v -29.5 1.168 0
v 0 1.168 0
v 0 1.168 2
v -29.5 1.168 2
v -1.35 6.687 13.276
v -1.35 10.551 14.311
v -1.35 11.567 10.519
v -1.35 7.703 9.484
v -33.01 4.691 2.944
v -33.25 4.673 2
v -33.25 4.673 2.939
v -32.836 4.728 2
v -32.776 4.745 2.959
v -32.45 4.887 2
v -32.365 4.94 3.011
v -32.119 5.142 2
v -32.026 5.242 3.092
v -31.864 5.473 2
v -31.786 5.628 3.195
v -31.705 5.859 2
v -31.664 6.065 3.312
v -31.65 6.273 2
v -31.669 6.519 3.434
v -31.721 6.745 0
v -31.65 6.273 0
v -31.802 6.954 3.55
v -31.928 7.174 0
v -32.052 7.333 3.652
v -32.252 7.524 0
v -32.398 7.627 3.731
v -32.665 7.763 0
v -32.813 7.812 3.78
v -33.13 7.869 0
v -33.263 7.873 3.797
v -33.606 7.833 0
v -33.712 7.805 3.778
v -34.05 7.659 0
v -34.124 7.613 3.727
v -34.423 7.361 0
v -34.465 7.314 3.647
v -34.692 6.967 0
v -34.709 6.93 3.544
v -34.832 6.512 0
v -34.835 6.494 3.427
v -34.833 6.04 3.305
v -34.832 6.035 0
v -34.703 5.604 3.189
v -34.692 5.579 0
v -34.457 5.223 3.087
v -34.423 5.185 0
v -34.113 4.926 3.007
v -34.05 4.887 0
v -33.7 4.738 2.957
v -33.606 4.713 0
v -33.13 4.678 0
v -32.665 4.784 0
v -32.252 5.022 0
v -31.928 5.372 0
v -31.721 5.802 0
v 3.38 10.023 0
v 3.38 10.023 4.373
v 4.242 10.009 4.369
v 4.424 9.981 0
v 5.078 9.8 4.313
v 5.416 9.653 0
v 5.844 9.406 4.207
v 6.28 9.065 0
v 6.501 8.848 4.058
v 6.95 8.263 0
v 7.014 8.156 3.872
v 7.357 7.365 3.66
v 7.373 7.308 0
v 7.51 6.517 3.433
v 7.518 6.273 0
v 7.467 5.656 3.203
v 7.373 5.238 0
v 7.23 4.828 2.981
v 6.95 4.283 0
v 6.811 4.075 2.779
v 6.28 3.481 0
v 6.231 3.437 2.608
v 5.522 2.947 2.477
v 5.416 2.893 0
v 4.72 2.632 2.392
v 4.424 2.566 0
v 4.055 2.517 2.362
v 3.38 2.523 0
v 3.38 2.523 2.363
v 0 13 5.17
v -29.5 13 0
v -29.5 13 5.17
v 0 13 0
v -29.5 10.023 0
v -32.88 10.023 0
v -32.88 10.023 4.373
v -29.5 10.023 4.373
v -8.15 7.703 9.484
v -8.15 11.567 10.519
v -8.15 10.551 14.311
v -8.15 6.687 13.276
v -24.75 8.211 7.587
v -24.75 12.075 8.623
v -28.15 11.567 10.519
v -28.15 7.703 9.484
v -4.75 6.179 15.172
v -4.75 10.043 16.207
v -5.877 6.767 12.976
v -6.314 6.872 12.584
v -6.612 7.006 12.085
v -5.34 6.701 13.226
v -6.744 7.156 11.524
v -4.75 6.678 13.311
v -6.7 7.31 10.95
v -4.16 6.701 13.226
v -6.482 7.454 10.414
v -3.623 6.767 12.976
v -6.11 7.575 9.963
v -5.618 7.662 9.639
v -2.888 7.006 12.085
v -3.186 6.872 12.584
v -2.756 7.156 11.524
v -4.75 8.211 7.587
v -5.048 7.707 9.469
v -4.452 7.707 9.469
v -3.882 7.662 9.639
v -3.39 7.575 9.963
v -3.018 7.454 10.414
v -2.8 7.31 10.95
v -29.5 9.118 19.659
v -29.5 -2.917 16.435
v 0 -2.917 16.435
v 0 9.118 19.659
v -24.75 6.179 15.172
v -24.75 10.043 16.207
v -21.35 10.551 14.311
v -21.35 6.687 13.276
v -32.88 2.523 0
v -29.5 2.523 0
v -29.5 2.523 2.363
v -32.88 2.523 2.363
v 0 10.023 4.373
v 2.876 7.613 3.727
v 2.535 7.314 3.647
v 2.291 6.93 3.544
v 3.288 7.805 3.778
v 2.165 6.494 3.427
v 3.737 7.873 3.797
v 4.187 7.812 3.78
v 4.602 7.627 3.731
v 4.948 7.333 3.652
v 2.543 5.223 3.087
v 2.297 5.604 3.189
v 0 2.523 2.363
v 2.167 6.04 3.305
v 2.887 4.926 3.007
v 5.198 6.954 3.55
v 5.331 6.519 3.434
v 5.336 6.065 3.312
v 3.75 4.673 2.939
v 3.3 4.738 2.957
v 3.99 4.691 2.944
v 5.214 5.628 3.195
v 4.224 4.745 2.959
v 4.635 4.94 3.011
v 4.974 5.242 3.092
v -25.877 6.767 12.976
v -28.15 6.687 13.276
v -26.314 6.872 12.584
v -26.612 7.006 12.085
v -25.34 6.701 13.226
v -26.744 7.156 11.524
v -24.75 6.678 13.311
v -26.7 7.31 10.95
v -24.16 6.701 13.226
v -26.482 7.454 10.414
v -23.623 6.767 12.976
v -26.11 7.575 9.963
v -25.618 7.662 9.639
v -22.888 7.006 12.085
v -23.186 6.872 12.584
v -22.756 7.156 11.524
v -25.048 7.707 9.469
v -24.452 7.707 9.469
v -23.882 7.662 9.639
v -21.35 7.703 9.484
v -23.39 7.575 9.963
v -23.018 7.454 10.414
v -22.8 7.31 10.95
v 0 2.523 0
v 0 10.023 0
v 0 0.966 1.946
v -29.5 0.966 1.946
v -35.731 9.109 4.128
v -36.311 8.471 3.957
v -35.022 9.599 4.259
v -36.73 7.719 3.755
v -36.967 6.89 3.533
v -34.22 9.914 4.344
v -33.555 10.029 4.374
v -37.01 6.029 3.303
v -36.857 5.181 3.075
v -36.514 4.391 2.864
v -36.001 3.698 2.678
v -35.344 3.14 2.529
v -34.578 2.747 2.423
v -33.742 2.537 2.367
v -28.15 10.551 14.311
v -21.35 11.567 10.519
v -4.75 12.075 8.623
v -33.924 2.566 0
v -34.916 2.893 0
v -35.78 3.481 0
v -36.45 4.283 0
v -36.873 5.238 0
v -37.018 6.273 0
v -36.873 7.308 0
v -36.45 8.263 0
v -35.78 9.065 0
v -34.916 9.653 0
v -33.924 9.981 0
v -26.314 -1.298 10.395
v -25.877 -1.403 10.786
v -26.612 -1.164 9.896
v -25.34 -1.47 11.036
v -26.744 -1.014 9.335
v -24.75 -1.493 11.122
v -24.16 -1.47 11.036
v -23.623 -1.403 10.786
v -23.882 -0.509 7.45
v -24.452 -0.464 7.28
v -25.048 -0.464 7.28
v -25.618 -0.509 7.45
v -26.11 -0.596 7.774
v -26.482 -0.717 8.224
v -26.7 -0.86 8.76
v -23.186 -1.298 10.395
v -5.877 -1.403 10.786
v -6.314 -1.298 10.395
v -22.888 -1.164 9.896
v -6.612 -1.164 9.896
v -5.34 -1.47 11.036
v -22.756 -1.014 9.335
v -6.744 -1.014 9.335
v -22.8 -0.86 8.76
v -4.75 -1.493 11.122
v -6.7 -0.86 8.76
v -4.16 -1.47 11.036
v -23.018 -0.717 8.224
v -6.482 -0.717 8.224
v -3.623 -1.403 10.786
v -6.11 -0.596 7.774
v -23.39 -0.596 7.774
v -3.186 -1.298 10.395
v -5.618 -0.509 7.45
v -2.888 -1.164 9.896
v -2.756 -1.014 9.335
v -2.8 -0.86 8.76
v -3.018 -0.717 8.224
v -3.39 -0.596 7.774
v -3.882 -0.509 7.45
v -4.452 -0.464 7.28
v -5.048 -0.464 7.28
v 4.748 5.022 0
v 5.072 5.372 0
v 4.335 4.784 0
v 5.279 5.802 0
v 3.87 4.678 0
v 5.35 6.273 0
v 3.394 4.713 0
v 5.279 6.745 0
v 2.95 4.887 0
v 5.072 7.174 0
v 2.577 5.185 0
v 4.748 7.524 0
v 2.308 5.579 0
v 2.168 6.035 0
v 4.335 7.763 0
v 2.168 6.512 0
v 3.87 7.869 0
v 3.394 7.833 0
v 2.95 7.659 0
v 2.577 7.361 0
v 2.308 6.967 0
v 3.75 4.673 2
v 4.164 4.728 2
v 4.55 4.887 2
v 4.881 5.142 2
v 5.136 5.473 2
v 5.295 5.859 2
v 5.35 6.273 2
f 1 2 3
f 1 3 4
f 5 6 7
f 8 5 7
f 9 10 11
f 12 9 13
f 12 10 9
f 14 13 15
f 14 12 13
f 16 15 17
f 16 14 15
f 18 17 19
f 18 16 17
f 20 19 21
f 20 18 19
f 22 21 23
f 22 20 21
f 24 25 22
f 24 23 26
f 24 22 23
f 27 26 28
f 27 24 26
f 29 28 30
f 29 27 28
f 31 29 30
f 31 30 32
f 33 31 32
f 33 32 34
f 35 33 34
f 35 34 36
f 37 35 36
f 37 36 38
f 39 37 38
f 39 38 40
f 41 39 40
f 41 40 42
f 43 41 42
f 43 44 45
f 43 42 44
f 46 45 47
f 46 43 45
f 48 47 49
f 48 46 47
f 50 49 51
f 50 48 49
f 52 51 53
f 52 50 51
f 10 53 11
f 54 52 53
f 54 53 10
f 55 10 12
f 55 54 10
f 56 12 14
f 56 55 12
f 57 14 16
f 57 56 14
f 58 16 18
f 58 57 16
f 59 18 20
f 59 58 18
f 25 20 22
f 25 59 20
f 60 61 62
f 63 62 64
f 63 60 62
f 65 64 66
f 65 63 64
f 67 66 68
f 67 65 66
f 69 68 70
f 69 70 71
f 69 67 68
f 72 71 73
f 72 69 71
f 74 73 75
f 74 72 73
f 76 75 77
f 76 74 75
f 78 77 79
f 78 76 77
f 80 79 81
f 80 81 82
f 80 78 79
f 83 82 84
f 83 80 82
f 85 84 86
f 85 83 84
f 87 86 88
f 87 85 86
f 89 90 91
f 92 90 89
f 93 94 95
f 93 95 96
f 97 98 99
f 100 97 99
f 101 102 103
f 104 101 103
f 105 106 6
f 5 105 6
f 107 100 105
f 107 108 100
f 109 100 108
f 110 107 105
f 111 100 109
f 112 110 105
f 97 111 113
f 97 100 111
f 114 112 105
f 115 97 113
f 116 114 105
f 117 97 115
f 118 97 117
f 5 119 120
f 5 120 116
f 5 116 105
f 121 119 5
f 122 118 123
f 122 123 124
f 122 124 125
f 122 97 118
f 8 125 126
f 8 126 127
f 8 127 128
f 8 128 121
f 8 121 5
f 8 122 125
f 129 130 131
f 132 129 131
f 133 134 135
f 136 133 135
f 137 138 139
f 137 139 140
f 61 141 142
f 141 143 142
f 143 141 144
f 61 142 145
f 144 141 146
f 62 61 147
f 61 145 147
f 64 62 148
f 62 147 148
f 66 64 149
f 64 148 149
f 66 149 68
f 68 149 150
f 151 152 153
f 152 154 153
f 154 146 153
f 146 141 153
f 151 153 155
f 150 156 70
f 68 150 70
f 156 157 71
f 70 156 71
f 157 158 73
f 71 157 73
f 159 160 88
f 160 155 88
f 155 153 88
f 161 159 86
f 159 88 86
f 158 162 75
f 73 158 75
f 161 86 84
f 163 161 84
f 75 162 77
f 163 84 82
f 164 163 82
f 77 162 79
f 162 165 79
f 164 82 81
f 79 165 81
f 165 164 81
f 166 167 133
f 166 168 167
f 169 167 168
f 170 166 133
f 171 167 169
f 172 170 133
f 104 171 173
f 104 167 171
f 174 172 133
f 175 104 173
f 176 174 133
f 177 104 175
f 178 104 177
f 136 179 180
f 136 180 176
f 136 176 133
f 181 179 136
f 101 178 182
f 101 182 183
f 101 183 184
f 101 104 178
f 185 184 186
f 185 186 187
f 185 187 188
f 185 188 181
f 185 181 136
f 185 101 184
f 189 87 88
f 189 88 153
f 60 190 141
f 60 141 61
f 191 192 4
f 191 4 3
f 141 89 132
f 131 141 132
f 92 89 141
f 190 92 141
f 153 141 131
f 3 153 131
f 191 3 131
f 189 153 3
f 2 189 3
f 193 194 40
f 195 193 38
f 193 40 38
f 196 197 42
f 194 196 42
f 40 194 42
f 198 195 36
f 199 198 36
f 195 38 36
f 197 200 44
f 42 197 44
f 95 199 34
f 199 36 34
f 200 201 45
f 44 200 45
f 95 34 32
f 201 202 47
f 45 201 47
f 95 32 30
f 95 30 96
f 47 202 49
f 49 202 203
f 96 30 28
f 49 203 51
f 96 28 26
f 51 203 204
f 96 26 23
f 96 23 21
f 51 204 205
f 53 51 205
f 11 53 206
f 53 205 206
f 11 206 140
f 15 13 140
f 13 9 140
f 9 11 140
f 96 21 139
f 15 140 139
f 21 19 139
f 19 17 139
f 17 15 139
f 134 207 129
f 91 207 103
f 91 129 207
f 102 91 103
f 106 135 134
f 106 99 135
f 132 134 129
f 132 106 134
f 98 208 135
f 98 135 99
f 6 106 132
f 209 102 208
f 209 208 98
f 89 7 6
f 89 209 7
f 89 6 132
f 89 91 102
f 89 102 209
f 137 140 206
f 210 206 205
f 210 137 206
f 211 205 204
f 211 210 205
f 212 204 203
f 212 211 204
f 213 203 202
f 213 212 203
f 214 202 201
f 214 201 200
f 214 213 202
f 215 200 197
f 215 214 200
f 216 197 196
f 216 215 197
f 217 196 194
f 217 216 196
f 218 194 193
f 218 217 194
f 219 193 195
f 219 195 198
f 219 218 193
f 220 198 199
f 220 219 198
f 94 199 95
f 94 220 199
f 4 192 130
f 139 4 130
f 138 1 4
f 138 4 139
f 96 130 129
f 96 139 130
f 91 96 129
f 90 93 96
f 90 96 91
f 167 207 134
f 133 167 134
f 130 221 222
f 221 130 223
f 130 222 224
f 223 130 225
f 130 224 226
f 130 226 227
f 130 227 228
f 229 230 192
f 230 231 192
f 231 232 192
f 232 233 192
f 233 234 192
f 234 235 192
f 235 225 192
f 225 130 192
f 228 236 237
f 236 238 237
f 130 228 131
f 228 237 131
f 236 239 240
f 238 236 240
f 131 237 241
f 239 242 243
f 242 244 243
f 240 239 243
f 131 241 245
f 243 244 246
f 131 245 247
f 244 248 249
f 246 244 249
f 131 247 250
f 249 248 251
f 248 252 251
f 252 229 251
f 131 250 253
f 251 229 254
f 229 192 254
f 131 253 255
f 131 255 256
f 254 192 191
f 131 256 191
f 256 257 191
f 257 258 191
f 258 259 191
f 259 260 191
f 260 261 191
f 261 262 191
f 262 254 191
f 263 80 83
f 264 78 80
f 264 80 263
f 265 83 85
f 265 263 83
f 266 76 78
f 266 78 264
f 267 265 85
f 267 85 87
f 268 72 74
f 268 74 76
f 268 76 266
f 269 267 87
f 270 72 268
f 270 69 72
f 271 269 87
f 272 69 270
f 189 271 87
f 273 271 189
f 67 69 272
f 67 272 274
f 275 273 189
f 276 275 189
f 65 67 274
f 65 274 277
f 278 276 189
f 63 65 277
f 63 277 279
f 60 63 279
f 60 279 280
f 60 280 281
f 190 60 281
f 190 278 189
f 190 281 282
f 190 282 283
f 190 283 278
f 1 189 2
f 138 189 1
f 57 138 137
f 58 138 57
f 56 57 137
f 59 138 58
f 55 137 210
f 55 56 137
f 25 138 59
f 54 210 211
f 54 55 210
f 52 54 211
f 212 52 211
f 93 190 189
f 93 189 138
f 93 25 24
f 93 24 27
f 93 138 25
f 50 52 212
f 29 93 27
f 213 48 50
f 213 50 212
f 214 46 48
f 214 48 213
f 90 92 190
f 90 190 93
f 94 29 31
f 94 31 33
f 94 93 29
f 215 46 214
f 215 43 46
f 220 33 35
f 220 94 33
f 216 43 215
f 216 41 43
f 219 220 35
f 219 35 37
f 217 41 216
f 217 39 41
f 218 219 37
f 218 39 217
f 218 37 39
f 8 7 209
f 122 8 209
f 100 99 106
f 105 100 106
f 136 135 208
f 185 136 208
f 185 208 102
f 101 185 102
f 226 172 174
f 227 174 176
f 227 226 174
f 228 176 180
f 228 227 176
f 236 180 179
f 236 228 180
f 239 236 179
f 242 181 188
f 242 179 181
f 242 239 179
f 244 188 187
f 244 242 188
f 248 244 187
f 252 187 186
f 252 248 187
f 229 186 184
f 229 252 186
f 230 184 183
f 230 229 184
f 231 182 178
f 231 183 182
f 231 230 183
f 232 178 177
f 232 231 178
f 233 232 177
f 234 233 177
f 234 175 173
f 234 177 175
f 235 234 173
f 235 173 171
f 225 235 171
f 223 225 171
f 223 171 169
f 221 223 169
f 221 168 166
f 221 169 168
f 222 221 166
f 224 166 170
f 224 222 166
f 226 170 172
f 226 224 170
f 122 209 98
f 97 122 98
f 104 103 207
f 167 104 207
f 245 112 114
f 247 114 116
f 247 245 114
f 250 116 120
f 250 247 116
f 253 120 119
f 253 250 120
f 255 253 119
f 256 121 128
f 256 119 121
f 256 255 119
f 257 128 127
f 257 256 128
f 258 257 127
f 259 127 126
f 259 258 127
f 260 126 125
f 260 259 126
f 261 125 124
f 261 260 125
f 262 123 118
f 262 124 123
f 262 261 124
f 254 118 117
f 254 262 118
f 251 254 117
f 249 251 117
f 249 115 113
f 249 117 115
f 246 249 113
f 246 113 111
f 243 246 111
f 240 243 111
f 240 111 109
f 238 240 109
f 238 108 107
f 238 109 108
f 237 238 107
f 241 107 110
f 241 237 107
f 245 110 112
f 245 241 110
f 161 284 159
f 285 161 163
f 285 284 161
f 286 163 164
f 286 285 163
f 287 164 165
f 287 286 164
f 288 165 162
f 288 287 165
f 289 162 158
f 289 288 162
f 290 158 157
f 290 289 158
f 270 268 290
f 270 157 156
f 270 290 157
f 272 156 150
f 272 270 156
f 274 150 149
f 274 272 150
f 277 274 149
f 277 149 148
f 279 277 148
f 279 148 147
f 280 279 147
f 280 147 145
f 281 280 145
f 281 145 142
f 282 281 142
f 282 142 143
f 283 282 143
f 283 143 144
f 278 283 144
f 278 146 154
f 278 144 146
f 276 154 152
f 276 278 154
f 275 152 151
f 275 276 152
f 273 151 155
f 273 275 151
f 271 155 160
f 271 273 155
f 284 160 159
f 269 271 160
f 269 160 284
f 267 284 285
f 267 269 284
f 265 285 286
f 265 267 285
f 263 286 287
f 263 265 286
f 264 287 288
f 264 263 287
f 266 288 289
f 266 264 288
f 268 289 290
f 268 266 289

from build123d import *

# Parameters (mm, degrees)
SKETCH1_R           = 1.6
BOSS_EXTRUDE1_DEPTH = 2
SKETCH3_W           = 29.5
SKETCH3_H           = 15
SKETCH3_R           = 2
BOSS_EXTRUDE2_DEPTH = 11.638171
BOSS_EXTRUDE3_REACH = 45.79
SKETCH1_2_R         = 1.6
SKETCH3_2_W         = 29.5
SKETCH3_2_H         = 15
SKETCH3_2_R         = 2
BOSS_EXTRUDE4_DEPTH = 12.458742
CUT_EXTRUDE1_DEPTH  = 4


with BuildPart() as part:
    # Sketch1 → Boss-Extrude1 (new body)
    with BuildSketch(Plane.XY):
        with BuildLine():
            Line((-32.88, 10.023123532), (-29.5, 10.023123532))
            Line((-29.5, 10.023123532), (-29.5, 13))
            Line((-29.5, 13), (0, 13))
            Line((0, 13), (0, 10.023123532))
            Line((0, 10.023123532), (3.38, 10.023123532))
            ThreePointArc((3.38, 10.023123532), (7.518209124, 6.273123532), (3.38, 2.523123532))
            Line((3.38, 2.523123532), (0, 2.523123532))
            Line((0, 2.523123532), (0, 1.167746206))
            Line((0, 1.167746206), (-29.5, 1.167746206))
            Line((-29.5, 1.167746206), (-29.5, 2.523123532))
            Line((-29.5, 2.523123532), (-32.88, 2.523123532))
            ThreePointArc((-32.88, 2.523123532), (-37.018209124, 6.273123532), (-32.88, 10.023123532))
        make_face()
        with Locations((-33.25, 6.273123532)):
            Circle(SKETCH1_R, mode=Mode.SUBTRACT)
        with Locations((3.75, 6.273123532)):
            Circle(SKETCH1_R, mode=Mode.SUBTRACT)
    extrude(amount=BOSS_EXTRUDE1_DEPTH)


with BuildPart() as body_2:
    # Sketch3 → Boss-Extrude2 (new body)
    with BuildSketch(Plane(origin=(0, 1.387555227, 0.371794302), x_dir=(1, 0, 0), z_dir=(0, 0.9659258262890684, 0.2588190451025204))):
        with Locations((-14.75, -9.129616695)):
            Rectangle(SKETCH3_W, SKETCH3_H)
        with Locations(Location((-4.75, -9.129616695, 0), (0, 0, 270))):
            Circle(SKETCH3_R, mode=Mode.SUBTRACT)
        with Locations(Location((-24.75, -9.129616695, 0), (0, 0, 270))):
            Circle(SKETCH3_R, mode=Mode.SUBTRACT)
    extrude(amount=BOSS_EXTRUDE2_DEPTH)

    # Boss-Extrude3: up to this face of the body (flat: up to its plane)
    boss_extrude3_end = Plane(body_2.part.faces().sort_by_distance((-14.75, 6.58658436, 3.451973307))[0])
    # Sketch1<2> → Boss-Extrude3 (add, up to the picked face)
    with BuildSketch(Plane.XY, mode=Mode.PRIVATE) as boss_extrude3_sk1:
        with BuildLine():
            Line((-32.88, 10.023123532), (-29.5, 10.023123532))
            Line((-29.5, 10.023123532), (-29.5, 13))
            Line((-29.5, 13), (0, 13))
            Line((0, 13), (0, 10.023123532))
            Line((0, 10.023123532), (3.38, 10.023123532))
            ThreePointArc((3.38, 10.023123532), (7.518209124, 6.273123532), (3.38, 2.523123532))
            Line((3.38, 2.523123532), (0, 2.523123532))
            Line((0, 2.523123532), (0, 1.167746206))
            Line((0, 1.167746206), (-29.5, 1.167746206))
            Line((-29.5, 1.167746206), (-29.5, 2.523123532))
            Line((-29.5, 2.523123532), (-32.88, 2.523123532))
            ThreePointArc((-32.88, 2.523123532), (-37.018209124, 6.273123532), (-32.88, 10.023123532))
        make_face()
        with Locations(Location((-33.25, 6.273123532, 0), (0, 0, 270))):
            Circle(SKETCH1_2_R, mode=Mode.SUBTRACT)
        with Locations(Location((3.75, 6.273123532, 0), (0, 0, 270))):
            Circle(SKETCH1_2_R, mode=Mode.SUBTRACT)
    boss_extrude3_tool1 = split(extrude(boss_extrude3_sk1.sketch, amount=BOSS_EXTRUDE3_REACH, mode=Mode.PRIVATE), bisect_by=boss_extrude3_end, keep=Keep.BOTH, mode=Mode.PRIVATE)

    add(part.part)  # Boss-Extrude3 merges part
    add(boss_extrude3_tool1.solids().sort_by(Axis((-14.75, 6.925418, 0), (0, 0, 1)))[0])

    # Sketch3<2> → Boss-Extrude4 (add)
    with BuildSketch(Plane(origin=(0, 1.387555227, 0.371794302), x_dir=(1, 0, 0), z_dir=(0, 0.9659258262890684, 0.2588190451025204))):
        with Locations((-14.75, -9.129616695)):
            Rectangle(SKETCH3_2_W, SKETCH3_2_H)
        with Locations(Location((-4.75, -9.129616695, 0), (0, 0, 270))):
            Circle(SKETCH3_2_R, mode=Mode.SUBTRACT)
        with Locations(Location((-24.75, -9.129616695, 0), (0, 0, 270))):
            Circle(SKETCH3_2_R, mode=Mode.SUBTRACT)
    extrude(amount=BOSS_EXTRUDE4_DEPTH)

    # Sketch4 → Cut-Extrude1 (cut)
    with BuildSketch(Plane(origin=(0, 13.421775837, 3.596353996), x_dir=(1, 0, 0), z_dir=(0, 0.9659258262890684, 0.2588190451025205))):
        Polygon((-1.35, -11.09260761), (-1.35, -7.166625779), (-4.75, -5.203634864), (-8.15, -7.166625779), (-8.15, -11.09260761), (-4.75, -13.055598525), align=None)
        Polygon((-21.35, -7.166625779), (-24.75, -5.203634864), (-28.15, -7.166625779), (-28.15, -11.09260761), (-24.75, -13.055598525), (-21.35, -11.09260761), align=None)
    extrude(amount=-CUT_EXTRUDE1_DEPTH, mode=Mode.SUBTRACT)


solid = body_2.part
